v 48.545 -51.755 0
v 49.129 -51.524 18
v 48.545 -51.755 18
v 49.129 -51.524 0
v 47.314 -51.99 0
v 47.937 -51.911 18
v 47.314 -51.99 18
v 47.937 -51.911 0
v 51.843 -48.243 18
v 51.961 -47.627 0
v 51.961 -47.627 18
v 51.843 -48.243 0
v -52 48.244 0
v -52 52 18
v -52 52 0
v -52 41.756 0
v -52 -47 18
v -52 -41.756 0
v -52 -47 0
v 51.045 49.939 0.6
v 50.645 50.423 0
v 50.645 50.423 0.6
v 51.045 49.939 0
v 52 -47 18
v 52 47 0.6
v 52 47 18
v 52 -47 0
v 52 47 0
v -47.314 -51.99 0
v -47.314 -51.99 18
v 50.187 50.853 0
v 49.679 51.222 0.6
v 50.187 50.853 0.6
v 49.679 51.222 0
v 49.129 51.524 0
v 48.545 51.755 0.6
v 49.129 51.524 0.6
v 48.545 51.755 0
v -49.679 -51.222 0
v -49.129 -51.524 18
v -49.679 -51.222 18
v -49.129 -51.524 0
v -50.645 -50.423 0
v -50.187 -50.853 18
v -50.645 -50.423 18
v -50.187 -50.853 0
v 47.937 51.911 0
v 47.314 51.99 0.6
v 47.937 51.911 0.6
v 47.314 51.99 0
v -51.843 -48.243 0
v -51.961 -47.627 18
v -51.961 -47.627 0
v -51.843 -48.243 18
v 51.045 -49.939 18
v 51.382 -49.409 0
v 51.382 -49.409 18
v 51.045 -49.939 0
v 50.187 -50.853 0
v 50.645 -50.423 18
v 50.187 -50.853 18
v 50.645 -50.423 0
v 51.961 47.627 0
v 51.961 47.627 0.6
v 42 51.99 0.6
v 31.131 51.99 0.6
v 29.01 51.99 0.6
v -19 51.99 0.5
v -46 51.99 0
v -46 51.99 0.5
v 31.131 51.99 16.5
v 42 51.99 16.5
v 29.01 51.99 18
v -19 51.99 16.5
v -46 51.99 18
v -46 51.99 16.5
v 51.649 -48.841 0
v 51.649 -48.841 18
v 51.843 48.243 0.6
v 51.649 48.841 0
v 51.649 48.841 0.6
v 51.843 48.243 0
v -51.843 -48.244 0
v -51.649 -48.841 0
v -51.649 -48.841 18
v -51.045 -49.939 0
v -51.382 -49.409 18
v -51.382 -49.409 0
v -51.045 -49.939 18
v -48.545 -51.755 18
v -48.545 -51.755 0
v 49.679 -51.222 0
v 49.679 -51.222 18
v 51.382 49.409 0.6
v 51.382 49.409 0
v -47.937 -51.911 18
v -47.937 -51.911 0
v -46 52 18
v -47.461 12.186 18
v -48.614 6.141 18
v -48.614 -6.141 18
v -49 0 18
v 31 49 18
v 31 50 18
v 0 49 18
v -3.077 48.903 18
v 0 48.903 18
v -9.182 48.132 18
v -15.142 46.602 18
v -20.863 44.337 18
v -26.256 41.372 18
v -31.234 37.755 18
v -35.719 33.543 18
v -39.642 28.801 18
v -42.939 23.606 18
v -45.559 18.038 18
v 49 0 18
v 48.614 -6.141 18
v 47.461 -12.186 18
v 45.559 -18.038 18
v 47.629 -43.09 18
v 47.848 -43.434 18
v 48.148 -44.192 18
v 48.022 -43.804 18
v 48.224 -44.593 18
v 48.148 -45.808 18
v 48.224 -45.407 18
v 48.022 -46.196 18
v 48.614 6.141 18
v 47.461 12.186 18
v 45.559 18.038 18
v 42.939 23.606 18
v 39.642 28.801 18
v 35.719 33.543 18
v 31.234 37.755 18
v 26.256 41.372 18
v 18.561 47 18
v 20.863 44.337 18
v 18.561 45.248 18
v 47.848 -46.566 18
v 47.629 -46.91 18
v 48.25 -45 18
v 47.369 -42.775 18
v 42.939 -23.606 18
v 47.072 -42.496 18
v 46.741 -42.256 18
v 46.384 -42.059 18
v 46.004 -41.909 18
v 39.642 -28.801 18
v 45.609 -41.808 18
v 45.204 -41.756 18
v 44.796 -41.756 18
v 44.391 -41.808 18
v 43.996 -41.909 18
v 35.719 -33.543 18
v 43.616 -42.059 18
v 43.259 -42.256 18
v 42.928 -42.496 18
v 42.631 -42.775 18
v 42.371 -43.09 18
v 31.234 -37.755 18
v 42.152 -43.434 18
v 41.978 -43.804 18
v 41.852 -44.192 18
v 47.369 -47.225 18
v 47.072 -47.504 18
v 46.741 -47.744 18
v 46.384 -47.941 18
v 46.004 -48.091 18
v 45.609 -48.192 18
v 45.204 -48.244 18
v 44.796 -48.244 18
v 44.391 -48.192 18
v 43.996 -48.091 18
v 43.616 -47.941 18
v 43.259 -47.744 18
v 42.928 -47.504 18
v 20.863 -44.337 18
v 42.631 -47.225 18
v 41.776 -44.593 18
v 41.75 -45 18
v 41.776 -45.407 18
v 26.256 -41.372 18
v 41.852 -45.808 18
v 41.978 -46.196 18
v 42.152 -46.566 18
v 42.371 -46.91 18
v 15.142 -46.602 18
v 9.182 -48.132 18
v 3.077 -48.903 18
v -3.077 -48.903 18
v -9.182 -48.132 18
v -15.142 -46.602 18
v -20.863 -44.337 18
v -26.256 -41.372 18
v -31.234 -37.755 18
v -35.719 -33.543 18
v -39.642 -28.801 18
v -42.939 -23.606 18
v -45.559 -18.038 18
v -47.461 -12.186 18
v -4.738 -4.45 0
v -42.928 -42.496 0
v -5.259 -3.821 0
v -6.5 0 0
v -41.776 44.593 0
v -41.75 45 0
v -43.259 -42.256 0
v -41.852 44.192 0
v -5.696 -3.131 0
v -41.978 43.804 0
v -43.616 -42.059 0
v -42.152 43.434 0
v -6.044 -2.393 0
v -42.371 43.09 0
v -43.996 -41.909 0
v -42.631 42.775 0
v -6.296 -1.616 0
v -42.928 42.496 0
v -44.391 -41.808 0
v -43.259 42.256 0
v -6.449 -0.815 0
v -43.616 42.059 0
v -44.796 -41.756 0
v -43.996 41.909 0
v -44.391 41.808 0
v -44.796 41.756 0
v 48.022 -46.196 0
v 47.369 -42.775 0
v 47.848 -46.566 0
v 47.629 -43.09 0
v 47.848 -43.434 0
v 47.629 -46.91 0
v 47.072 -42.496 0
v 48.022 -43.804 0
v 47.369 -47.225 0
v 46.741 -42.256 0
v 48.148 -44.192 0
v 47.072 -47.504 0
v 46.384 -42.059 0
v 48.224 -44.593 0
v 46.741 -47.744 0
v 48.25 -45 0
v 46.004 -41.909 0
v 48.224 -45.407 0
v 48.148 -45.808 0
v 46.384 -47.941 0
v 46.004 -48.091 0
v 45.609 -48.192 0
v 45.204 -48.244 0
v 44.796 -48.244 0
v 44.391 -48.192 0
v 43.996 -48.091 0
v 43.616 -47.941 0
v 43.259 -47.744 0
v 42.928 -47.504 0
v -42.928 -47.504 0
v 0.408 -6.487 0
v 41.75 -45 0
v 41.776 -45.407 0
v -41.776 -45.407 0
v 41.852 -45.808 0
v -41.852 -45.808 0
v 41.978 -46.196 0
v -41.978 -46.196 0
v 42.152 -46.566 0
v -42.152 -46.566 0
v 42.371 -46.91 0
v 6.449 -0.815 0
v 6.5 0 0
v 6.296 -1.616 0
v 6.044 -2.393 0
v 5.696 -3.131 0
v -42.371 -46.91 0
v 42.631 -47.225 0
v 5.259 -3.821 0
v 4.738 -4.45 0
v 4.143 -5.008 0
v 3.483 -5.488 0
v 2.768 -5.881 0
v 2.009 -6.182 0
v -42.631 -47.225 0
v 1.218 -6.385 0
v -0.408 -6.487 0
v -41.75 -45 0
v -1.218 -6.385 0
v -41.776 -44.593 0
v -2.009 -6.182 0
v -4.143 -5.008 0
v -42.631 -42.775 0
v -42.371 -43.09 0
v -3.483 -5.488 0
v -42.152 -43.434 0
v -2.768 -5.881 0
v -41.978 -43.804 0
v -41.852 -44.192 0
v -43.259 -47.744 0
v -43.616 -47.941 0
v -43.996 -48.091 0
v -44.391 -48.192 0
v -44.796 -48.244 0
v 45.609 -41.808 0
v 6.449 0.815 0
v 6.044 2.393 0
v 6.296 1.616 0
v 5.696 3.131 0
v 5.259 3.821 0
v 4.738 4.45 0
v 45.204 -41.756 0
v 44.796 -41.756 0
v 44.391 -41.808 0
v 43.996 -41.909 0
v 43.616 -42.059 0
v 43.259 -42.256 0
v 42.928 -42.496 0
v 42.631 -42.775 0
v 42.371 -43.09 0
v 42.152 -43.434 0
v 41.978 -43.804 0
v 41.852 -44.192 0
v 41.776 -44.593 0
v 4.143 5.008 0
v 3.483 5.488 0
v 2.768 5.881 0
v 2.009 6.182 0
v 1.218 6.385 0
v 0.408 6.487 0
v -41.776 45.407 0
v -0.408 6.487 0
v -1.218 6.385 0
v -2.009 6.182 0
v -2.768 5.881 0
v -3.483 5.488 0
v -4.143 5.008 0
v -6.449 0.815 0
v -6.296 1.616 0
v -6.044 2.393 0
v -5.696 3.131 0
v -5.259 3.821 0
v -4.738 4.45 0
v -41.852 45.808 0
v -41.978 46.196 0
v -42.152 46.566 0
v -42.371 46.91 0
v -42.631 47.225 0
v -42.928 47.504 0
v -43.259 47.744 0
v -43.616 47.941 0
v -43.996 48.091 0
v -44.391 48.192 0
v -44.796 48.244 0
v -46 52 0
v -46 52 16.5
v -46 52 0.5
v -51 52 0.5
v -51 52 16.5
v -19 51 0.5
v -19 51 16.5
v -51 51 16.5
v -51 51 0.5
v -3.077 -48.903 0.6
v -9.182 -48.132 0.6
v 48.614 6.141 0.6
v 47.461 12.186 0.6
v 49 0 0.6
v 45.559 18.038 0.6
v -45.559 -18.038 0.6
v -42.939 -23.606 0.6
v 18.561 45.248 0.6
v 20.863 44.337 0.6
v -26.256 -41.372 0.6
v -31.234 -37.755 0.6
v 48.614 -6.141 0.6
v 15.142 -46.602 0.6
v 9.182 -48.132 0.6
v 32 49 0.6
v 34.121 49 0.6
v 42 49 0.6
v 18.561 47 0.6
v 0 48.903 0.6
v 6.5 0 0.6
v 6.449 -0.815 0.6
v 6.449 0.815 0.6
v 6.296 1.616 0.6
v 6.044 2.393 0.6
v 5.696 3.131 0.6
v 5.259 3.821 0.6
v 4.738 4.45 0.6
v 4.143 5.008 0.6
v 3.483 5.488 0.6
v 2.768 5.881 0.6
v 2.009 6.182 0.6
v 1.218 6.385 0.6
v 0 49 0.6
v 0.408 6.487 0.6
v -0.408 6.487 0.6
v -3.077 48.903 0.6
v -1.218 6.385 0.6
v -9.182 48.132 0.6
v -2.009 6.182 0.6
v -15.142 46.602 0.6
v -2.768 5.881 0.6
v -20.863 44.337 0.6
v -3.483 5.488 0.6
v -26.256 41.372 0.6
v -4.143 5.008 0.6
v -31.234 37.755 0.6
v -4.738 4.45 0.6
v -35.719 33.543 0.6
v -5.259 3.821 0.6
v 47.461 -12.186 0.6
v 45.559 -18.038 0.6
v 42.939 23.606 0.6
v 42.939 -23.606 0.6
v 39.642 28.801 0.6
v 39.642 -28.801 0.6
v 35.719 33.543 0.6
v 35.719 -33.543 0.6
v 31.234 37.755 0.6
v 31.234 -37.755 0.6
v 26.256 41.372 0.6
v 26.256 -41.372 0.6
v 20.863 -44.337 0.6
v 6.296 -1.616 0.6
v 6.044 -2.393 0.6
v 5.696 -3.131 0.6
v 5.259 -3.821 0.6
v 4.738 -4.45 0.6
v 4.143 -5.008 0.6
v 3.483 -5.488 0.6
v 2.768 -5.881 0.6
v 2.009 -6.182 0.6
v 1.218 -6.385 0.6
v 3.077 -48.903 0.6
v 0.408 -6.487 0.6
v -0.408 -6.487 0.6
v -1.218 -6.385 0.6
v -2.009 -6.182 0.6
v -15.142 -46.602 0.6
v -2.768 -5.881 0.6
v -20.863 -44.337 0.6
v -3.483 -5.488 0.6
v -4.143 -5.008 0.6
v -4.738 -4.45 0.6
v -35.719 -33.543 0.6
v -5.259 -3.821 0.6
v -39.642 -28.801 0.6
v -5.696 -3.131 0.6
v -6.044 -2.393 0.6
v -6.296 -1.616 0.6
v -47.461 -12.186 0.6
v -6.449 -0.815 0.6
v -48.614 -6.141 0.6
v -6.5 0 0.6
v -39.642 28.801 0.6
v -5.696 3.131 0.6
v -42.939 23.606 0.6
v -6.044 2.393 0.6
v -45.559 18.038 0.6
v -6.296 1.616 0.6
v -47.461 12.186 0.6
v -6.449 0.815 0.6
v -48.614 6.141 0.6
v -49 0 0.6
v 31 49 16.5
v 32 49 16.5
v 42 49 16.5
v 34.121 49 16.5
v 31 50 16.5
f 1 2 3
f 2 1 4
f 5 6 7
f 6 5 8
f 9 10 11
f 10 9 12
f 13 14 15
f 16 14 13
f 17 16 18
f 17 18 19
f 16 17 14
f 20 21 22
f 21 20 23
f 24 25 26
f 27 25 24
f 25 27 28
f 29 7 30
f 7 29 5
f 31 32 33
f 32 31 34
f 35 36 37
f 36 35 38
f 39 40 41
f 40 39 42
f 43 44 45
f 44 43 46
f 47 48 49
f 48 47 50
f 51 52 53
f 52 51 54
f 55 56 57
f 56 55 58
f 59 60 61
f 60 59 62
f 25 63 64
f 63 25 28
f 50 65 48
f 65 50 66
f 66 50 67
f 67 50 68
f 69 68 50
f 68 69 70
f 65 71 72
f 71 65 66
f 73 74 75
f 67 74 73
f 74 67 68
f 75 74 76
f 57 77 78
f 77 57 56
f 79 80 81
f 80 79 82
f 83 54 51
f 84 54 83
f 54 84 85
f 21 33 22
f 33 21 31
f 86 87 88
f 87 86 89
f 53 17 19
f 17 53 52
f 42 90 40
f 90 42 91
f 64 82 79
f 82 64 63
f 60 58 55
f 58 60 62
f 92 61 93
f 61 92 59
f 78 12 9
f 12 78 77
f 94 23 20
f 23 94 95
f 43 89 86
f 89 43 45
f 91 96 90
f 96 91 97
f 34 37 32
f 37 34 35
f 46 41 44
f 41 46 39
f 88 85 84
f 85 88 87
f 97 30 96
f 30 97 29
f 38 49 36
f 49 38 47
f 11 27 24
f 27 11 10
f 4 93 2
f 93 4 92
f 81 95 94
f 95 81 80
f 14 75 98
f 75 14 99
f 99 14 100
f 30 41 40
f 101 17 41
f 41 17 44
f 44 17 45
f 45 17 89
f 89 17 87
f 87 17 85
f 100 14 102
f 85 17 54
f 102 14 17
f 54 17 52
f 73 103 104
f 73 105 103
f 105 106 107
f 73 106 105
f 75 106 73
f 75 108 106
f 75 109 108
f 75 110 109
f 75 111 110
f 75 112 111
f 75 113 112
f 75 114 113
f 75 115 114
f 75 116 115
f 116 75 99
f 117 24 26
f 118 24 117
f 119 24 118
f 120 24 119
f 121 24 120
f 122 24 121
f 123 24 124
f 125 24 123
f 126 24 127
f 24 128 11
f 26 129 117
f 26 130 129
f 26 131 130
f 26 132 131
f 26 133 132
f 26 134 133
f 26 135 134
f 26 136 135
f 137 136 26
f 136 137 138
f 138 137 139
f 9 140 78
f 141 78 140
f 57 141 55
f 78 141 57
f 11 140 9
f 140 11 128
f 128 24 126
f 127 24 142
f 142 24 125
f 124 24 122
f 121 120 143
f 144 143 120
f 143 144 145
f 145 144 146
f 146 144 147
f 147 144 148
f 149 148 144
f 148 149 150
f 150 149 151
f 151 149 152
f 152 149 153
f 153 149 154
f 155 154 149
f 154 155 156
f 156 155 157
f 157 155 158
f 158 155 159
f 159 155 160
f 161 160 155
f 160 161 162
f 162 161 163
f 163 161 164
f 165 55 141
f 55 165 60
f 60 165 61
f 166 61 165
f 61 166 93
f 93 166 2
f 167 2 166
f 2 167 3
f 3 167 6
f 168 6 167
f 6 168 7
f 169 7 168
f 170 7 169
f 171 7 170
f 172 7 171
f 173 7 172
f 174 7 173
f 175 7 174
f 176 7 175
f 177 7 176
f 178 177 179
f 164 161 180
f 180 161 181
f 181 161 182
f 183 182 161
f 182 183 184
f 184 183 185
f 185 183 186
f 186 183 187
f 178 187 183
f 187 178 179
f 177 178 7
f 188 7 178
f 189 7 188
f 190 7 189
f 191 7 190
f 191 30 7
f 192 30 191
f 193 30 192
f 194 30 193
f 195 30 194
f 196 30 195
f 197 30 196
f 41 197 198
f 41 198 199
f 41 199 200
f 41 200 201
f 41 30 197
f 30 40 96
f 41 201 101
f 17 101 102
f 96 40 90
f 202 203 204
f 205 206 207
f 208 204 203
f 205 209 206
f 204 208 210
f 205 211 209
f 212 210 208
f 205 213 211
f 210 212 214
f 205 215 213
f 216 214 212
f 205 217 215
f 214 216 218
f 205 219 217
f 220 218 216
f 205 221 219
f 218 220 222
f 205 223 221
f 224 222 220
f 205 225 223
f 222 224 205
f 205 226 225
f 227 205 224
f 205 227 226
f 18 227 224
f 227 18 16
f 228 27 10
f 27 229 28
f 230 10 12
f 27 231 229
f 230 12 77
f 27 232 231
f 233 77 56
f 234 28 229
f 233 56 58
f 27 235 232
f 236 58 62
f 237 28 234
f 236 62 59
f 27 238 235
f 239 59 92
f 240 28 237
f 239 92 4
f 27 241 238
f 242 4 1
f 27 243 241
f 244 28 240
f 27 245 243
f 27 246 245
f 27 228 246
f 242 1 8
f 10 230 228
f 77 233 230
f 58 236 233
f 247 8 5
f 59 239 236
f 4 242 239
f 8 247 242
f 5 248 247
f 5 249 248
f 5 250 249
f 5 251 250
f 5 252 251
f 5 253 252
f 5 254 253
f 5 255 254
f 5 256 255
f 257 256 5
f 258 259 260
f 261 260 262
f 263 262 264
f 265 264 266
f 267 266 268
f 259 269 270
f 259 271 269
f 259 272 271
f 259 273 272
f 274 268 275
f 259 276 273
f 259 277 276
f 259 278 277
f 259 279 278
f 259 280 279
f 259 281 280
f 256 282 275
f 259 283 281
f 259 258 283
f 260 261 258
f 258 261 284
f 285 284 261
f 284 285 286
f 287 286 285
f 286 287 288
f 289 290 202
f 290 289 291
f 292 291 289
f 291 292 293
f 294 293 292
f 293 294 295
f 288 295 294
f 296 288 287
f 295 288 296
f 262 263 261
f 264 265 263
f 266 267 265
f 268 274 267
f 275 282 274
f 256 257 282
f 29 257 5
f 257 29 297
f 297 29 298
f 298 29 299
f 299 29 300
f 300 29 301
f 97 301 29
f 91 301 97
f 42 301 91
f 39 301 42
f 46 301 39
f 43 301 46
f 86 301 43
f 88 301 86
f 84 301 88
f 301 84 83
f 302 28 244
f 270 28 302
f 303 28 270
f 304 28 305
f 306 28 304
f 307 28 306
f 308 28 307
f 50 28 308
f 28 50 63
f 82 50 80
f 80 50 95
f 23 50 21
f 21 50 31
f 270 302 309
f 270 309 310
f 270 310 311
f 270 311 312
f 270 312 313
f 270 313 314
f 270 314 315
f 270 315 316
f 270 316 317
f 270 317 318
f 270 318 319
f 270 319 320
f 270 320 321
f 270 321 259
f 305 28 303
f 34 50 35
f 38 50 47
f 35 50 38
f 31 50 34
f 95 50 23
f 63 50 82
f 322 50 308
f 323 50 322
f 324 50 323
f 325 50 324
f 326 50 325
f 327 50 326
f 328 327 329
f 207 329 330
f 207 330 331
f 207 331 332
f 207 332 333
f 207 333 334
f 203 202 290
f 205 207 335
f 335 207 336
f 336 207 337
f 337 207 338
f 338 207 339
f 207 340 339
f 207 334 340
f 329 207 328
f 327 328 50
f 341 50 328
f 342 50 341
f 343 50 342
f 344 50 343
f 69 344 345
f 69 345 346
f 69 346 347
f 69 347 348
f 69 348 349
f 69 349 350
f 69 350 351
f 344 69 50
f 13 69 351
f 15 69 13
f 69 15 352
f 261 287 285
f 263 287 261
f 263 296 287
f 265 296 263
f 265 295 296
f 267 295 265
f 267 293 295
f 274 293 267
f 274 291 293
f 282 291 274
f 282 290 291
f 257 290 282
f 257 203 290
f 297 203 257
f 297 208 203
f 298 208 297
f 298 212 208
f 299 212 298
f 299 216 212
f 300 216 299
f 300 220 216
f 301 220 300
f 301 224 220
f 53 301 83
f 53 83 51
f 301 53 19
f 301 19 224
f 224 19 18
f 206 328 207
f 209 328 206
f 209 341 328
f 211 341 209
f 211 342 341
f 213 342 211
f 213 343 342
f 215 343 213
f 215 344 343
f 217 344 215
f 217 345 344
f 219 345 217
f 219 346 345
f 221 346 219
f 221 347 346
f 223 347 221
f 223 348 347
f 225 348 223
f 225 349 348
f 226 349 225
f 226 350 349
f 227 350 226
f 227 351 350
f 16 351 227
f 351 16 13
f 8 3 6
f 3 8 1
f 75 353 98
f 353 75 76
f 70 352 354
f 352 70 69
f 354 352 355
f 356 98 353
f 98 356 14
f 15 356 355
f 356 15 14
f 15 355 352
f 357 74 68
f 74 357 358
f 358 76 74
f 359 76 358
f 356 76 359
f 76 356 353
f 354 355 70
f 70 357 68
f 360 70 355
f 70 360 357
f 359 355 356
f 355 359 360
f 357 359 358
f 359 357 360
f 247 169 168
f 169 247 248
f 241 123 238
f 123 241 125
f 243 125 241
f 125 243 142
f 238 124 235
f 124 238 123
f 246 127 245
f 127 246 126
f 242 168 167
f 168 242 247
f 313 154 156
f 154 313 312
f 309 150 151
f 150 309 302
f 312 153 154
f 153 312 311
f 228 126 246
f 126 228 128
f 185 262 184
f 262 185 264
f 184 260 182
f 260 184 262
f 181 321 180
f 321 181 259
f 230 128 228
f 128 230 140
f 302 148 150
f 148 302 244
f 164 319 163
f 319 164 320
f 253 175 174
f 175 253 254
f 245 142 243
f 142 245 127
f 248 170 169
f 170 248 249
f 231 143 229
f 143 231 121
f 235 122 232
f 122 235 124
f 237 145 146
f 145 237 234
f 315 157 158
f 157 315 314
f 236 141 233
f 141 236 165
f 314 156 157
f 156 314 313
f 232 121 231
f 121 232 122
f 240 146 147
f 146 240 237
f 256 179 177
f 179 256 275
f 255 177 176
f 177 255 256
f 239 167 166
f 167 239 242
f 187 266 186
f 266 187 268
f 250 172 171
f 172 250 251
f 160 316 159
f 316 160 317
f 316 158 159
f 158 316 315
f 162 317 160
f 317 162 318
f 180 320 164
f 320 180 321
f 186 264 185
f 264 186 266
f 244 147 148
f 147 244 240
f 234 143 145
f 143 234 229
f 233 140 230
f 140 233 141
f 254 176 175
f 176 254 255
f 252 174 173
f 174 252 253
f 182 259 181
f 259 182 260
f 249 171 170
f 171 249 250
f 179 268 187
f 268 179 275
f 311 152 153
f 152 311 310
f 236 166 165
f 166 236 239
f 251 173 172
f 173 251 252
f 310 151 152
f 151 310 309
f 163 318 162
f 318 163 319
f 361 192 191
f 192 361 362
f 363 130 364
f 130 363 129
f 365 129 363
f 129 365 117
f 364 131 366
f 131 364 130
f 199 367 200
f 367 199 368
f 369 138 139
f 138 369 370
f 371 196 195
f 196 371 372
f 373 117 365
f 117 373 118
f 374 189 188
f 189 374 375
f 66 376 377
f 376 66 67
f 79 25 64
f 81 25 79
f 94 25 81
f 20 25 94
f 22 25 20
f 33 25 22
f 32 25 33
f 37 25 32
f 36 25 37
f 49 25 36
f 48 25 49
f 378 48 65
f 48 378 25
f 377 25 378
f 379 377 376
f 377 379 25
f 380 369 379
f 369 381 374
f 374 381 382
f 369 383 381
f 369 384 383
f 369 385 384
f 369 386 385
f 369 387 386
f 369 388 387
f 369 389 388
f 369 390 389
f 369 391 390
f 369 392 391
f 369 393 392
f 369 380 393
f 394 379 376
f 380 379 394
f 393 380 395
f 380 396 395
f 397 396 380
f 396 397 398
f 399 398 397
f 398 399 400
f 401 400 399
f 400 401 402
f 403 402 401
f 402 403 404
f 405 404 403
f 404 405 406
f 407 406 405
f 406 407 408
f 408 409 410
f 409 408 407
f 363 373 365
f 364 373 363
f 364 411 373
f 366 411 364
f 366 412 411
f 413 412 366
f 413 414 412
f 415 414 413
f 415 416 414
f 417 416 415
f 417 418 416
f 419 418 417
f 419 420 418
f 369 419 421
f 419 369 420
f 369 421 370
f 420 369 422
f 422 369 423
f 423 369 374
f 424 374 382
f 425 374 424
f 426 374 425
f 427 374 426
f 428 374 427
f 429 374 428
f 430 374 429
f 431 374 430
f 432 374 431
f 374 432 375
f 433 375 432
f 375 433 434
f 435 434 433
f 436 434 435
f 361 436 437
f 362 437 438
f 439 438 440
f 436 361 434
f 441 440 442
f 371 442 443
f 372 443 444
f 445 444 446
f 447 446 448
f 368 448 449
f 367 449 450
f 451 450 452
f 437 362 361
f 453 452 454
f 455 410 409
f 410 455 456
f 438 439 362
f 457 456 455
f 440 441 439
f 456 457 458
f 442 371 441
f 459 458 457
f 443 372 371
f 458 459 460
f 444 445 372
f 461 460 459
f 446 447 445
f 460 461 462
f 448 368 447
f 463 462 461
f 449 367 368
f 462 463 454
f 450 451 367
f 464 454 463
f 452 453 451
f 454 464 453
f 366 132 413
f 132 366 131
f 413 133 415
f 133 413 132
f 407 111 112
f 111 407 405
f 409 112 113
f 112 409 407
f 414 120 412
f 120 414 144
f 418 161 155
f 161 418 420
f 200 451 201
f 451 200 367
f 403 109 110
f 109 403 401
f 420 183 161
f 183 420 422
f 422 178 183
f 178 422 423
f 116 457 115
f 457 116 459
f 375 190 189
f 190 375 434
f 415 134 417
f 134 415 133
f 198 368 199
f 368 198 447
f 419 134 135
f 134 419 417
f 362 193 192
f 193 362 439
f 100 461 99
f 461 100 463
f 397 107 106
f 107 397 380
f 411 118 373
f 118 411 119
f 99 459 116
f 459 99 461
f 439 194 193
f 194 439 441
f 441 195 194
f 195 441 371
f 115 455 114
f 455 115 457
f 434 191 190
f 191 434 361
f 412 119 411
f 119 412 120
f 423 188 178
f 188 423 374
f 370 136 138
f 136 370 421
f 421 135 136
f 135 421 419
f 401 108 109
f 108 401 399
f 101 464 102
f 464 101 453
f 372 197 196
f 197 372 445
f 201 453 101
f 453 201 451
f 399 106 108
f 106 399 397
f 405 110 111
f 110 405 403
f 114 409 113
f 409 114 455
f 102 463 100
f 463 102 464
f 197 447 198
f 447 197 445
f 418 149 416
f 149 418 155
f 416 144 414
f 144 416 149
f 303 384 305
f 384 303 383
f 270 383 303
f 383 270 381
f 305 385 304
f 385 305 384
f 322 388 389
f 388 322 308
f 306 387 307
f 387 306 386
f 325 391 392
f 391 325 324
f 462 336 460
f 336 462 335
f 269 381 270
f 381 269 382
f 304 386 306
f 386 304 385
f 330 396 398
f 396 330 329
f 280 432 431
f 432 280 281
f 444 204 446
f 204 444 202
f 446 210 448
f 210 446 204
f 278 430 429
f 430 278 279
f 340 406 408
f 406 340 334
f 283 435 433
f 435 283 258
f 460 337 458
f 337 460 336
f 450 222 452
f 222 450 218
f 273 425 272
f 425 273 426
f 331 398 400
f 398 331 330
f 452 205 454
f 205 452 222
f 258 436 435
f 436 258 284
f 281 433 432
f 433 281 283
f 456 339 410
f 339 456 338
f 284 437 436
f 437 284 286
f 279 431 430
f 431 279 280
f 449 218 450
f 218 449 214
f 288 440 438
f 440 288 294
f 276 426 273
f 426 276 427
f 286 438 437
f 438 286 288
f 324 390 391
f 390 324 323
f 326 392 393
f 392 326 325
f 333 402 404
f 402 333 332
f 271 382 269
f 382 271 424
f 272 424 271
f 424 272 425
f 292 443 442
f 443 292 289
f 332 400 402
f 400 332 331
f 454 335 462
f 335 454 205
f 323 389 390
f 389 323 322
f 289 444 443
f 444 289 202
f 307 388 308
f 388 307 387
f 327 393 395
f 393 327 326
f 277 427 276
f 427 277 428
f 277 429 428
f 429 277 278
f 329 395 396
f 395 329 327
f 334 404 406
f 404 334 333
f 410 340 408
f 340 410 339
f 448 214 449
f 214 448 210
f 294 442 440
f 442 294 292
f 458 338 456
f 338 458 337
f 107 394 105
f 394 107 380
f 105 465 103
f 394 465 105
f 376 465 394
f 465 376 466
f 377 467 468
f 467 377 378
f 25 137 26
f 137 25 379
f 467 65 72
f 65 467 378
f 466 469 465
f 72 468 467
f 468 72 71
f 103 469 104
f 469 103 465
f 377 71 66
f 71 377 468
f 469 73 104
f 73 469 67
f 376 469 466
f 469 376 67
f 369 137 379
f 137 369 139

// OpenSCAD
$fn = 50;


difference() {
	union() {
		hull() {
			translate(v = [-47.0000000000, 47.0000000000, 0]) {
				cylinder(h = 18, r = 5);
			}
			translate(v = [47.0000000000, 47.0000000000, 0]) {
				cylinder(h = 18, r = 5);
			}
			translate(v = [-47.0000000000, -47.0000000000, 0]) {
				cylinder(h = 18, r = 5);
			}
			translate(v = [47.0000000000, -47.0000000000, 0]) {
				cylinder(h = 18, r = 5);
			}
		}
		translate(v = [-52.0000000000, 46.0000000000, 0]) {
			cube(size = [6, 6, 18]);
		}
	}
	union() {
		translate(v = [-52.5000000000, -45.0000000000, -250.0000000000]) {
			rotate(a = [0, 0, 0]) {
				difference() {
					union() {
						hull() {
							translate(v = [7.5000000000, 0, 0]) {
								cylinder(h = 250, r = 3.2500000000, r1 = 3.2500000000, r2 = 3.2500000000);
							}
							translate(v = [-7.5000000000, 0, 0]) {
								cylinder(h = 250, r = 3.2500000000, r1 = 3.2500000000, r2 = 3.2500000000);
							}
						}
					}
					union();
				}
			}
		}
		translate(v = [-52.5000000000, 45.0000000000, -250.0000000000]) {
			rotate(a = [0, 0, 0]) {
				difference() {
					union() {
						hull() {
							translate(v = [7.5000000000, 0, 0]) {
								cylinder(h = 250, r = 3.2500000000, r1 = 3.2500000000, r2 = 3.2500000000);
							}
							translate(v = [-7.5000000000, 0, 0]) {
								cylinder(h = 250, r = 3.2500000000, r1 = 3.2500000000, r2 = 3.2500000000);
							}
						}
					}
					union();
				}
			}
		}
		translate(v = [-51.0000000000, 51.0000000000, 0.5000000000]) {
			cube(size = [32, 1, 16]);
		}
		translate(v = [45.0000000000, -45.0000000000, -50.0000000000]) {
			cylinder(h = 100, r = 3.2500000000);
		}
		translate(v = [0, 0, 0.6000000000]) {
			cylinder(h = 20.4000000000, r = 49.0000000000);
		}
		translate(v = [0, 0, -9.0000000000]) {
			cylinder(h = 18, r = 6.5000000000);
		}
		translate(v = [0.0000000000, 47.0000000000, 0.6000000000]) {
			cube(size = [52.0000000000, 2, 20.4000000000]);
		}
		translate(v = [42.0000000000, 47.0000000000, 0.6000000000]) {
			cube(size = [10, 5, 20.4000000000]);
		}
		translate(v = [31.0000000000, 47.0000000000, 16.5000000000]) {
			cube(size = [21, 5, 1.5000000000]);
		}
		translate(v = [28.2500000000, 52.7500000000, 0.6000000000]) {
			rotate(a = [0, 0, -45]) {
				cube(size = [7.5000000000, 1.5000000000, 20.4000000000]);
			}
		}
		translate(v = [11.0610000000, 45.0000000000, 0.6000000000]) {
			cube(size = [7.5000000000, 2, 17.4000000000]);
		}
	}
}
